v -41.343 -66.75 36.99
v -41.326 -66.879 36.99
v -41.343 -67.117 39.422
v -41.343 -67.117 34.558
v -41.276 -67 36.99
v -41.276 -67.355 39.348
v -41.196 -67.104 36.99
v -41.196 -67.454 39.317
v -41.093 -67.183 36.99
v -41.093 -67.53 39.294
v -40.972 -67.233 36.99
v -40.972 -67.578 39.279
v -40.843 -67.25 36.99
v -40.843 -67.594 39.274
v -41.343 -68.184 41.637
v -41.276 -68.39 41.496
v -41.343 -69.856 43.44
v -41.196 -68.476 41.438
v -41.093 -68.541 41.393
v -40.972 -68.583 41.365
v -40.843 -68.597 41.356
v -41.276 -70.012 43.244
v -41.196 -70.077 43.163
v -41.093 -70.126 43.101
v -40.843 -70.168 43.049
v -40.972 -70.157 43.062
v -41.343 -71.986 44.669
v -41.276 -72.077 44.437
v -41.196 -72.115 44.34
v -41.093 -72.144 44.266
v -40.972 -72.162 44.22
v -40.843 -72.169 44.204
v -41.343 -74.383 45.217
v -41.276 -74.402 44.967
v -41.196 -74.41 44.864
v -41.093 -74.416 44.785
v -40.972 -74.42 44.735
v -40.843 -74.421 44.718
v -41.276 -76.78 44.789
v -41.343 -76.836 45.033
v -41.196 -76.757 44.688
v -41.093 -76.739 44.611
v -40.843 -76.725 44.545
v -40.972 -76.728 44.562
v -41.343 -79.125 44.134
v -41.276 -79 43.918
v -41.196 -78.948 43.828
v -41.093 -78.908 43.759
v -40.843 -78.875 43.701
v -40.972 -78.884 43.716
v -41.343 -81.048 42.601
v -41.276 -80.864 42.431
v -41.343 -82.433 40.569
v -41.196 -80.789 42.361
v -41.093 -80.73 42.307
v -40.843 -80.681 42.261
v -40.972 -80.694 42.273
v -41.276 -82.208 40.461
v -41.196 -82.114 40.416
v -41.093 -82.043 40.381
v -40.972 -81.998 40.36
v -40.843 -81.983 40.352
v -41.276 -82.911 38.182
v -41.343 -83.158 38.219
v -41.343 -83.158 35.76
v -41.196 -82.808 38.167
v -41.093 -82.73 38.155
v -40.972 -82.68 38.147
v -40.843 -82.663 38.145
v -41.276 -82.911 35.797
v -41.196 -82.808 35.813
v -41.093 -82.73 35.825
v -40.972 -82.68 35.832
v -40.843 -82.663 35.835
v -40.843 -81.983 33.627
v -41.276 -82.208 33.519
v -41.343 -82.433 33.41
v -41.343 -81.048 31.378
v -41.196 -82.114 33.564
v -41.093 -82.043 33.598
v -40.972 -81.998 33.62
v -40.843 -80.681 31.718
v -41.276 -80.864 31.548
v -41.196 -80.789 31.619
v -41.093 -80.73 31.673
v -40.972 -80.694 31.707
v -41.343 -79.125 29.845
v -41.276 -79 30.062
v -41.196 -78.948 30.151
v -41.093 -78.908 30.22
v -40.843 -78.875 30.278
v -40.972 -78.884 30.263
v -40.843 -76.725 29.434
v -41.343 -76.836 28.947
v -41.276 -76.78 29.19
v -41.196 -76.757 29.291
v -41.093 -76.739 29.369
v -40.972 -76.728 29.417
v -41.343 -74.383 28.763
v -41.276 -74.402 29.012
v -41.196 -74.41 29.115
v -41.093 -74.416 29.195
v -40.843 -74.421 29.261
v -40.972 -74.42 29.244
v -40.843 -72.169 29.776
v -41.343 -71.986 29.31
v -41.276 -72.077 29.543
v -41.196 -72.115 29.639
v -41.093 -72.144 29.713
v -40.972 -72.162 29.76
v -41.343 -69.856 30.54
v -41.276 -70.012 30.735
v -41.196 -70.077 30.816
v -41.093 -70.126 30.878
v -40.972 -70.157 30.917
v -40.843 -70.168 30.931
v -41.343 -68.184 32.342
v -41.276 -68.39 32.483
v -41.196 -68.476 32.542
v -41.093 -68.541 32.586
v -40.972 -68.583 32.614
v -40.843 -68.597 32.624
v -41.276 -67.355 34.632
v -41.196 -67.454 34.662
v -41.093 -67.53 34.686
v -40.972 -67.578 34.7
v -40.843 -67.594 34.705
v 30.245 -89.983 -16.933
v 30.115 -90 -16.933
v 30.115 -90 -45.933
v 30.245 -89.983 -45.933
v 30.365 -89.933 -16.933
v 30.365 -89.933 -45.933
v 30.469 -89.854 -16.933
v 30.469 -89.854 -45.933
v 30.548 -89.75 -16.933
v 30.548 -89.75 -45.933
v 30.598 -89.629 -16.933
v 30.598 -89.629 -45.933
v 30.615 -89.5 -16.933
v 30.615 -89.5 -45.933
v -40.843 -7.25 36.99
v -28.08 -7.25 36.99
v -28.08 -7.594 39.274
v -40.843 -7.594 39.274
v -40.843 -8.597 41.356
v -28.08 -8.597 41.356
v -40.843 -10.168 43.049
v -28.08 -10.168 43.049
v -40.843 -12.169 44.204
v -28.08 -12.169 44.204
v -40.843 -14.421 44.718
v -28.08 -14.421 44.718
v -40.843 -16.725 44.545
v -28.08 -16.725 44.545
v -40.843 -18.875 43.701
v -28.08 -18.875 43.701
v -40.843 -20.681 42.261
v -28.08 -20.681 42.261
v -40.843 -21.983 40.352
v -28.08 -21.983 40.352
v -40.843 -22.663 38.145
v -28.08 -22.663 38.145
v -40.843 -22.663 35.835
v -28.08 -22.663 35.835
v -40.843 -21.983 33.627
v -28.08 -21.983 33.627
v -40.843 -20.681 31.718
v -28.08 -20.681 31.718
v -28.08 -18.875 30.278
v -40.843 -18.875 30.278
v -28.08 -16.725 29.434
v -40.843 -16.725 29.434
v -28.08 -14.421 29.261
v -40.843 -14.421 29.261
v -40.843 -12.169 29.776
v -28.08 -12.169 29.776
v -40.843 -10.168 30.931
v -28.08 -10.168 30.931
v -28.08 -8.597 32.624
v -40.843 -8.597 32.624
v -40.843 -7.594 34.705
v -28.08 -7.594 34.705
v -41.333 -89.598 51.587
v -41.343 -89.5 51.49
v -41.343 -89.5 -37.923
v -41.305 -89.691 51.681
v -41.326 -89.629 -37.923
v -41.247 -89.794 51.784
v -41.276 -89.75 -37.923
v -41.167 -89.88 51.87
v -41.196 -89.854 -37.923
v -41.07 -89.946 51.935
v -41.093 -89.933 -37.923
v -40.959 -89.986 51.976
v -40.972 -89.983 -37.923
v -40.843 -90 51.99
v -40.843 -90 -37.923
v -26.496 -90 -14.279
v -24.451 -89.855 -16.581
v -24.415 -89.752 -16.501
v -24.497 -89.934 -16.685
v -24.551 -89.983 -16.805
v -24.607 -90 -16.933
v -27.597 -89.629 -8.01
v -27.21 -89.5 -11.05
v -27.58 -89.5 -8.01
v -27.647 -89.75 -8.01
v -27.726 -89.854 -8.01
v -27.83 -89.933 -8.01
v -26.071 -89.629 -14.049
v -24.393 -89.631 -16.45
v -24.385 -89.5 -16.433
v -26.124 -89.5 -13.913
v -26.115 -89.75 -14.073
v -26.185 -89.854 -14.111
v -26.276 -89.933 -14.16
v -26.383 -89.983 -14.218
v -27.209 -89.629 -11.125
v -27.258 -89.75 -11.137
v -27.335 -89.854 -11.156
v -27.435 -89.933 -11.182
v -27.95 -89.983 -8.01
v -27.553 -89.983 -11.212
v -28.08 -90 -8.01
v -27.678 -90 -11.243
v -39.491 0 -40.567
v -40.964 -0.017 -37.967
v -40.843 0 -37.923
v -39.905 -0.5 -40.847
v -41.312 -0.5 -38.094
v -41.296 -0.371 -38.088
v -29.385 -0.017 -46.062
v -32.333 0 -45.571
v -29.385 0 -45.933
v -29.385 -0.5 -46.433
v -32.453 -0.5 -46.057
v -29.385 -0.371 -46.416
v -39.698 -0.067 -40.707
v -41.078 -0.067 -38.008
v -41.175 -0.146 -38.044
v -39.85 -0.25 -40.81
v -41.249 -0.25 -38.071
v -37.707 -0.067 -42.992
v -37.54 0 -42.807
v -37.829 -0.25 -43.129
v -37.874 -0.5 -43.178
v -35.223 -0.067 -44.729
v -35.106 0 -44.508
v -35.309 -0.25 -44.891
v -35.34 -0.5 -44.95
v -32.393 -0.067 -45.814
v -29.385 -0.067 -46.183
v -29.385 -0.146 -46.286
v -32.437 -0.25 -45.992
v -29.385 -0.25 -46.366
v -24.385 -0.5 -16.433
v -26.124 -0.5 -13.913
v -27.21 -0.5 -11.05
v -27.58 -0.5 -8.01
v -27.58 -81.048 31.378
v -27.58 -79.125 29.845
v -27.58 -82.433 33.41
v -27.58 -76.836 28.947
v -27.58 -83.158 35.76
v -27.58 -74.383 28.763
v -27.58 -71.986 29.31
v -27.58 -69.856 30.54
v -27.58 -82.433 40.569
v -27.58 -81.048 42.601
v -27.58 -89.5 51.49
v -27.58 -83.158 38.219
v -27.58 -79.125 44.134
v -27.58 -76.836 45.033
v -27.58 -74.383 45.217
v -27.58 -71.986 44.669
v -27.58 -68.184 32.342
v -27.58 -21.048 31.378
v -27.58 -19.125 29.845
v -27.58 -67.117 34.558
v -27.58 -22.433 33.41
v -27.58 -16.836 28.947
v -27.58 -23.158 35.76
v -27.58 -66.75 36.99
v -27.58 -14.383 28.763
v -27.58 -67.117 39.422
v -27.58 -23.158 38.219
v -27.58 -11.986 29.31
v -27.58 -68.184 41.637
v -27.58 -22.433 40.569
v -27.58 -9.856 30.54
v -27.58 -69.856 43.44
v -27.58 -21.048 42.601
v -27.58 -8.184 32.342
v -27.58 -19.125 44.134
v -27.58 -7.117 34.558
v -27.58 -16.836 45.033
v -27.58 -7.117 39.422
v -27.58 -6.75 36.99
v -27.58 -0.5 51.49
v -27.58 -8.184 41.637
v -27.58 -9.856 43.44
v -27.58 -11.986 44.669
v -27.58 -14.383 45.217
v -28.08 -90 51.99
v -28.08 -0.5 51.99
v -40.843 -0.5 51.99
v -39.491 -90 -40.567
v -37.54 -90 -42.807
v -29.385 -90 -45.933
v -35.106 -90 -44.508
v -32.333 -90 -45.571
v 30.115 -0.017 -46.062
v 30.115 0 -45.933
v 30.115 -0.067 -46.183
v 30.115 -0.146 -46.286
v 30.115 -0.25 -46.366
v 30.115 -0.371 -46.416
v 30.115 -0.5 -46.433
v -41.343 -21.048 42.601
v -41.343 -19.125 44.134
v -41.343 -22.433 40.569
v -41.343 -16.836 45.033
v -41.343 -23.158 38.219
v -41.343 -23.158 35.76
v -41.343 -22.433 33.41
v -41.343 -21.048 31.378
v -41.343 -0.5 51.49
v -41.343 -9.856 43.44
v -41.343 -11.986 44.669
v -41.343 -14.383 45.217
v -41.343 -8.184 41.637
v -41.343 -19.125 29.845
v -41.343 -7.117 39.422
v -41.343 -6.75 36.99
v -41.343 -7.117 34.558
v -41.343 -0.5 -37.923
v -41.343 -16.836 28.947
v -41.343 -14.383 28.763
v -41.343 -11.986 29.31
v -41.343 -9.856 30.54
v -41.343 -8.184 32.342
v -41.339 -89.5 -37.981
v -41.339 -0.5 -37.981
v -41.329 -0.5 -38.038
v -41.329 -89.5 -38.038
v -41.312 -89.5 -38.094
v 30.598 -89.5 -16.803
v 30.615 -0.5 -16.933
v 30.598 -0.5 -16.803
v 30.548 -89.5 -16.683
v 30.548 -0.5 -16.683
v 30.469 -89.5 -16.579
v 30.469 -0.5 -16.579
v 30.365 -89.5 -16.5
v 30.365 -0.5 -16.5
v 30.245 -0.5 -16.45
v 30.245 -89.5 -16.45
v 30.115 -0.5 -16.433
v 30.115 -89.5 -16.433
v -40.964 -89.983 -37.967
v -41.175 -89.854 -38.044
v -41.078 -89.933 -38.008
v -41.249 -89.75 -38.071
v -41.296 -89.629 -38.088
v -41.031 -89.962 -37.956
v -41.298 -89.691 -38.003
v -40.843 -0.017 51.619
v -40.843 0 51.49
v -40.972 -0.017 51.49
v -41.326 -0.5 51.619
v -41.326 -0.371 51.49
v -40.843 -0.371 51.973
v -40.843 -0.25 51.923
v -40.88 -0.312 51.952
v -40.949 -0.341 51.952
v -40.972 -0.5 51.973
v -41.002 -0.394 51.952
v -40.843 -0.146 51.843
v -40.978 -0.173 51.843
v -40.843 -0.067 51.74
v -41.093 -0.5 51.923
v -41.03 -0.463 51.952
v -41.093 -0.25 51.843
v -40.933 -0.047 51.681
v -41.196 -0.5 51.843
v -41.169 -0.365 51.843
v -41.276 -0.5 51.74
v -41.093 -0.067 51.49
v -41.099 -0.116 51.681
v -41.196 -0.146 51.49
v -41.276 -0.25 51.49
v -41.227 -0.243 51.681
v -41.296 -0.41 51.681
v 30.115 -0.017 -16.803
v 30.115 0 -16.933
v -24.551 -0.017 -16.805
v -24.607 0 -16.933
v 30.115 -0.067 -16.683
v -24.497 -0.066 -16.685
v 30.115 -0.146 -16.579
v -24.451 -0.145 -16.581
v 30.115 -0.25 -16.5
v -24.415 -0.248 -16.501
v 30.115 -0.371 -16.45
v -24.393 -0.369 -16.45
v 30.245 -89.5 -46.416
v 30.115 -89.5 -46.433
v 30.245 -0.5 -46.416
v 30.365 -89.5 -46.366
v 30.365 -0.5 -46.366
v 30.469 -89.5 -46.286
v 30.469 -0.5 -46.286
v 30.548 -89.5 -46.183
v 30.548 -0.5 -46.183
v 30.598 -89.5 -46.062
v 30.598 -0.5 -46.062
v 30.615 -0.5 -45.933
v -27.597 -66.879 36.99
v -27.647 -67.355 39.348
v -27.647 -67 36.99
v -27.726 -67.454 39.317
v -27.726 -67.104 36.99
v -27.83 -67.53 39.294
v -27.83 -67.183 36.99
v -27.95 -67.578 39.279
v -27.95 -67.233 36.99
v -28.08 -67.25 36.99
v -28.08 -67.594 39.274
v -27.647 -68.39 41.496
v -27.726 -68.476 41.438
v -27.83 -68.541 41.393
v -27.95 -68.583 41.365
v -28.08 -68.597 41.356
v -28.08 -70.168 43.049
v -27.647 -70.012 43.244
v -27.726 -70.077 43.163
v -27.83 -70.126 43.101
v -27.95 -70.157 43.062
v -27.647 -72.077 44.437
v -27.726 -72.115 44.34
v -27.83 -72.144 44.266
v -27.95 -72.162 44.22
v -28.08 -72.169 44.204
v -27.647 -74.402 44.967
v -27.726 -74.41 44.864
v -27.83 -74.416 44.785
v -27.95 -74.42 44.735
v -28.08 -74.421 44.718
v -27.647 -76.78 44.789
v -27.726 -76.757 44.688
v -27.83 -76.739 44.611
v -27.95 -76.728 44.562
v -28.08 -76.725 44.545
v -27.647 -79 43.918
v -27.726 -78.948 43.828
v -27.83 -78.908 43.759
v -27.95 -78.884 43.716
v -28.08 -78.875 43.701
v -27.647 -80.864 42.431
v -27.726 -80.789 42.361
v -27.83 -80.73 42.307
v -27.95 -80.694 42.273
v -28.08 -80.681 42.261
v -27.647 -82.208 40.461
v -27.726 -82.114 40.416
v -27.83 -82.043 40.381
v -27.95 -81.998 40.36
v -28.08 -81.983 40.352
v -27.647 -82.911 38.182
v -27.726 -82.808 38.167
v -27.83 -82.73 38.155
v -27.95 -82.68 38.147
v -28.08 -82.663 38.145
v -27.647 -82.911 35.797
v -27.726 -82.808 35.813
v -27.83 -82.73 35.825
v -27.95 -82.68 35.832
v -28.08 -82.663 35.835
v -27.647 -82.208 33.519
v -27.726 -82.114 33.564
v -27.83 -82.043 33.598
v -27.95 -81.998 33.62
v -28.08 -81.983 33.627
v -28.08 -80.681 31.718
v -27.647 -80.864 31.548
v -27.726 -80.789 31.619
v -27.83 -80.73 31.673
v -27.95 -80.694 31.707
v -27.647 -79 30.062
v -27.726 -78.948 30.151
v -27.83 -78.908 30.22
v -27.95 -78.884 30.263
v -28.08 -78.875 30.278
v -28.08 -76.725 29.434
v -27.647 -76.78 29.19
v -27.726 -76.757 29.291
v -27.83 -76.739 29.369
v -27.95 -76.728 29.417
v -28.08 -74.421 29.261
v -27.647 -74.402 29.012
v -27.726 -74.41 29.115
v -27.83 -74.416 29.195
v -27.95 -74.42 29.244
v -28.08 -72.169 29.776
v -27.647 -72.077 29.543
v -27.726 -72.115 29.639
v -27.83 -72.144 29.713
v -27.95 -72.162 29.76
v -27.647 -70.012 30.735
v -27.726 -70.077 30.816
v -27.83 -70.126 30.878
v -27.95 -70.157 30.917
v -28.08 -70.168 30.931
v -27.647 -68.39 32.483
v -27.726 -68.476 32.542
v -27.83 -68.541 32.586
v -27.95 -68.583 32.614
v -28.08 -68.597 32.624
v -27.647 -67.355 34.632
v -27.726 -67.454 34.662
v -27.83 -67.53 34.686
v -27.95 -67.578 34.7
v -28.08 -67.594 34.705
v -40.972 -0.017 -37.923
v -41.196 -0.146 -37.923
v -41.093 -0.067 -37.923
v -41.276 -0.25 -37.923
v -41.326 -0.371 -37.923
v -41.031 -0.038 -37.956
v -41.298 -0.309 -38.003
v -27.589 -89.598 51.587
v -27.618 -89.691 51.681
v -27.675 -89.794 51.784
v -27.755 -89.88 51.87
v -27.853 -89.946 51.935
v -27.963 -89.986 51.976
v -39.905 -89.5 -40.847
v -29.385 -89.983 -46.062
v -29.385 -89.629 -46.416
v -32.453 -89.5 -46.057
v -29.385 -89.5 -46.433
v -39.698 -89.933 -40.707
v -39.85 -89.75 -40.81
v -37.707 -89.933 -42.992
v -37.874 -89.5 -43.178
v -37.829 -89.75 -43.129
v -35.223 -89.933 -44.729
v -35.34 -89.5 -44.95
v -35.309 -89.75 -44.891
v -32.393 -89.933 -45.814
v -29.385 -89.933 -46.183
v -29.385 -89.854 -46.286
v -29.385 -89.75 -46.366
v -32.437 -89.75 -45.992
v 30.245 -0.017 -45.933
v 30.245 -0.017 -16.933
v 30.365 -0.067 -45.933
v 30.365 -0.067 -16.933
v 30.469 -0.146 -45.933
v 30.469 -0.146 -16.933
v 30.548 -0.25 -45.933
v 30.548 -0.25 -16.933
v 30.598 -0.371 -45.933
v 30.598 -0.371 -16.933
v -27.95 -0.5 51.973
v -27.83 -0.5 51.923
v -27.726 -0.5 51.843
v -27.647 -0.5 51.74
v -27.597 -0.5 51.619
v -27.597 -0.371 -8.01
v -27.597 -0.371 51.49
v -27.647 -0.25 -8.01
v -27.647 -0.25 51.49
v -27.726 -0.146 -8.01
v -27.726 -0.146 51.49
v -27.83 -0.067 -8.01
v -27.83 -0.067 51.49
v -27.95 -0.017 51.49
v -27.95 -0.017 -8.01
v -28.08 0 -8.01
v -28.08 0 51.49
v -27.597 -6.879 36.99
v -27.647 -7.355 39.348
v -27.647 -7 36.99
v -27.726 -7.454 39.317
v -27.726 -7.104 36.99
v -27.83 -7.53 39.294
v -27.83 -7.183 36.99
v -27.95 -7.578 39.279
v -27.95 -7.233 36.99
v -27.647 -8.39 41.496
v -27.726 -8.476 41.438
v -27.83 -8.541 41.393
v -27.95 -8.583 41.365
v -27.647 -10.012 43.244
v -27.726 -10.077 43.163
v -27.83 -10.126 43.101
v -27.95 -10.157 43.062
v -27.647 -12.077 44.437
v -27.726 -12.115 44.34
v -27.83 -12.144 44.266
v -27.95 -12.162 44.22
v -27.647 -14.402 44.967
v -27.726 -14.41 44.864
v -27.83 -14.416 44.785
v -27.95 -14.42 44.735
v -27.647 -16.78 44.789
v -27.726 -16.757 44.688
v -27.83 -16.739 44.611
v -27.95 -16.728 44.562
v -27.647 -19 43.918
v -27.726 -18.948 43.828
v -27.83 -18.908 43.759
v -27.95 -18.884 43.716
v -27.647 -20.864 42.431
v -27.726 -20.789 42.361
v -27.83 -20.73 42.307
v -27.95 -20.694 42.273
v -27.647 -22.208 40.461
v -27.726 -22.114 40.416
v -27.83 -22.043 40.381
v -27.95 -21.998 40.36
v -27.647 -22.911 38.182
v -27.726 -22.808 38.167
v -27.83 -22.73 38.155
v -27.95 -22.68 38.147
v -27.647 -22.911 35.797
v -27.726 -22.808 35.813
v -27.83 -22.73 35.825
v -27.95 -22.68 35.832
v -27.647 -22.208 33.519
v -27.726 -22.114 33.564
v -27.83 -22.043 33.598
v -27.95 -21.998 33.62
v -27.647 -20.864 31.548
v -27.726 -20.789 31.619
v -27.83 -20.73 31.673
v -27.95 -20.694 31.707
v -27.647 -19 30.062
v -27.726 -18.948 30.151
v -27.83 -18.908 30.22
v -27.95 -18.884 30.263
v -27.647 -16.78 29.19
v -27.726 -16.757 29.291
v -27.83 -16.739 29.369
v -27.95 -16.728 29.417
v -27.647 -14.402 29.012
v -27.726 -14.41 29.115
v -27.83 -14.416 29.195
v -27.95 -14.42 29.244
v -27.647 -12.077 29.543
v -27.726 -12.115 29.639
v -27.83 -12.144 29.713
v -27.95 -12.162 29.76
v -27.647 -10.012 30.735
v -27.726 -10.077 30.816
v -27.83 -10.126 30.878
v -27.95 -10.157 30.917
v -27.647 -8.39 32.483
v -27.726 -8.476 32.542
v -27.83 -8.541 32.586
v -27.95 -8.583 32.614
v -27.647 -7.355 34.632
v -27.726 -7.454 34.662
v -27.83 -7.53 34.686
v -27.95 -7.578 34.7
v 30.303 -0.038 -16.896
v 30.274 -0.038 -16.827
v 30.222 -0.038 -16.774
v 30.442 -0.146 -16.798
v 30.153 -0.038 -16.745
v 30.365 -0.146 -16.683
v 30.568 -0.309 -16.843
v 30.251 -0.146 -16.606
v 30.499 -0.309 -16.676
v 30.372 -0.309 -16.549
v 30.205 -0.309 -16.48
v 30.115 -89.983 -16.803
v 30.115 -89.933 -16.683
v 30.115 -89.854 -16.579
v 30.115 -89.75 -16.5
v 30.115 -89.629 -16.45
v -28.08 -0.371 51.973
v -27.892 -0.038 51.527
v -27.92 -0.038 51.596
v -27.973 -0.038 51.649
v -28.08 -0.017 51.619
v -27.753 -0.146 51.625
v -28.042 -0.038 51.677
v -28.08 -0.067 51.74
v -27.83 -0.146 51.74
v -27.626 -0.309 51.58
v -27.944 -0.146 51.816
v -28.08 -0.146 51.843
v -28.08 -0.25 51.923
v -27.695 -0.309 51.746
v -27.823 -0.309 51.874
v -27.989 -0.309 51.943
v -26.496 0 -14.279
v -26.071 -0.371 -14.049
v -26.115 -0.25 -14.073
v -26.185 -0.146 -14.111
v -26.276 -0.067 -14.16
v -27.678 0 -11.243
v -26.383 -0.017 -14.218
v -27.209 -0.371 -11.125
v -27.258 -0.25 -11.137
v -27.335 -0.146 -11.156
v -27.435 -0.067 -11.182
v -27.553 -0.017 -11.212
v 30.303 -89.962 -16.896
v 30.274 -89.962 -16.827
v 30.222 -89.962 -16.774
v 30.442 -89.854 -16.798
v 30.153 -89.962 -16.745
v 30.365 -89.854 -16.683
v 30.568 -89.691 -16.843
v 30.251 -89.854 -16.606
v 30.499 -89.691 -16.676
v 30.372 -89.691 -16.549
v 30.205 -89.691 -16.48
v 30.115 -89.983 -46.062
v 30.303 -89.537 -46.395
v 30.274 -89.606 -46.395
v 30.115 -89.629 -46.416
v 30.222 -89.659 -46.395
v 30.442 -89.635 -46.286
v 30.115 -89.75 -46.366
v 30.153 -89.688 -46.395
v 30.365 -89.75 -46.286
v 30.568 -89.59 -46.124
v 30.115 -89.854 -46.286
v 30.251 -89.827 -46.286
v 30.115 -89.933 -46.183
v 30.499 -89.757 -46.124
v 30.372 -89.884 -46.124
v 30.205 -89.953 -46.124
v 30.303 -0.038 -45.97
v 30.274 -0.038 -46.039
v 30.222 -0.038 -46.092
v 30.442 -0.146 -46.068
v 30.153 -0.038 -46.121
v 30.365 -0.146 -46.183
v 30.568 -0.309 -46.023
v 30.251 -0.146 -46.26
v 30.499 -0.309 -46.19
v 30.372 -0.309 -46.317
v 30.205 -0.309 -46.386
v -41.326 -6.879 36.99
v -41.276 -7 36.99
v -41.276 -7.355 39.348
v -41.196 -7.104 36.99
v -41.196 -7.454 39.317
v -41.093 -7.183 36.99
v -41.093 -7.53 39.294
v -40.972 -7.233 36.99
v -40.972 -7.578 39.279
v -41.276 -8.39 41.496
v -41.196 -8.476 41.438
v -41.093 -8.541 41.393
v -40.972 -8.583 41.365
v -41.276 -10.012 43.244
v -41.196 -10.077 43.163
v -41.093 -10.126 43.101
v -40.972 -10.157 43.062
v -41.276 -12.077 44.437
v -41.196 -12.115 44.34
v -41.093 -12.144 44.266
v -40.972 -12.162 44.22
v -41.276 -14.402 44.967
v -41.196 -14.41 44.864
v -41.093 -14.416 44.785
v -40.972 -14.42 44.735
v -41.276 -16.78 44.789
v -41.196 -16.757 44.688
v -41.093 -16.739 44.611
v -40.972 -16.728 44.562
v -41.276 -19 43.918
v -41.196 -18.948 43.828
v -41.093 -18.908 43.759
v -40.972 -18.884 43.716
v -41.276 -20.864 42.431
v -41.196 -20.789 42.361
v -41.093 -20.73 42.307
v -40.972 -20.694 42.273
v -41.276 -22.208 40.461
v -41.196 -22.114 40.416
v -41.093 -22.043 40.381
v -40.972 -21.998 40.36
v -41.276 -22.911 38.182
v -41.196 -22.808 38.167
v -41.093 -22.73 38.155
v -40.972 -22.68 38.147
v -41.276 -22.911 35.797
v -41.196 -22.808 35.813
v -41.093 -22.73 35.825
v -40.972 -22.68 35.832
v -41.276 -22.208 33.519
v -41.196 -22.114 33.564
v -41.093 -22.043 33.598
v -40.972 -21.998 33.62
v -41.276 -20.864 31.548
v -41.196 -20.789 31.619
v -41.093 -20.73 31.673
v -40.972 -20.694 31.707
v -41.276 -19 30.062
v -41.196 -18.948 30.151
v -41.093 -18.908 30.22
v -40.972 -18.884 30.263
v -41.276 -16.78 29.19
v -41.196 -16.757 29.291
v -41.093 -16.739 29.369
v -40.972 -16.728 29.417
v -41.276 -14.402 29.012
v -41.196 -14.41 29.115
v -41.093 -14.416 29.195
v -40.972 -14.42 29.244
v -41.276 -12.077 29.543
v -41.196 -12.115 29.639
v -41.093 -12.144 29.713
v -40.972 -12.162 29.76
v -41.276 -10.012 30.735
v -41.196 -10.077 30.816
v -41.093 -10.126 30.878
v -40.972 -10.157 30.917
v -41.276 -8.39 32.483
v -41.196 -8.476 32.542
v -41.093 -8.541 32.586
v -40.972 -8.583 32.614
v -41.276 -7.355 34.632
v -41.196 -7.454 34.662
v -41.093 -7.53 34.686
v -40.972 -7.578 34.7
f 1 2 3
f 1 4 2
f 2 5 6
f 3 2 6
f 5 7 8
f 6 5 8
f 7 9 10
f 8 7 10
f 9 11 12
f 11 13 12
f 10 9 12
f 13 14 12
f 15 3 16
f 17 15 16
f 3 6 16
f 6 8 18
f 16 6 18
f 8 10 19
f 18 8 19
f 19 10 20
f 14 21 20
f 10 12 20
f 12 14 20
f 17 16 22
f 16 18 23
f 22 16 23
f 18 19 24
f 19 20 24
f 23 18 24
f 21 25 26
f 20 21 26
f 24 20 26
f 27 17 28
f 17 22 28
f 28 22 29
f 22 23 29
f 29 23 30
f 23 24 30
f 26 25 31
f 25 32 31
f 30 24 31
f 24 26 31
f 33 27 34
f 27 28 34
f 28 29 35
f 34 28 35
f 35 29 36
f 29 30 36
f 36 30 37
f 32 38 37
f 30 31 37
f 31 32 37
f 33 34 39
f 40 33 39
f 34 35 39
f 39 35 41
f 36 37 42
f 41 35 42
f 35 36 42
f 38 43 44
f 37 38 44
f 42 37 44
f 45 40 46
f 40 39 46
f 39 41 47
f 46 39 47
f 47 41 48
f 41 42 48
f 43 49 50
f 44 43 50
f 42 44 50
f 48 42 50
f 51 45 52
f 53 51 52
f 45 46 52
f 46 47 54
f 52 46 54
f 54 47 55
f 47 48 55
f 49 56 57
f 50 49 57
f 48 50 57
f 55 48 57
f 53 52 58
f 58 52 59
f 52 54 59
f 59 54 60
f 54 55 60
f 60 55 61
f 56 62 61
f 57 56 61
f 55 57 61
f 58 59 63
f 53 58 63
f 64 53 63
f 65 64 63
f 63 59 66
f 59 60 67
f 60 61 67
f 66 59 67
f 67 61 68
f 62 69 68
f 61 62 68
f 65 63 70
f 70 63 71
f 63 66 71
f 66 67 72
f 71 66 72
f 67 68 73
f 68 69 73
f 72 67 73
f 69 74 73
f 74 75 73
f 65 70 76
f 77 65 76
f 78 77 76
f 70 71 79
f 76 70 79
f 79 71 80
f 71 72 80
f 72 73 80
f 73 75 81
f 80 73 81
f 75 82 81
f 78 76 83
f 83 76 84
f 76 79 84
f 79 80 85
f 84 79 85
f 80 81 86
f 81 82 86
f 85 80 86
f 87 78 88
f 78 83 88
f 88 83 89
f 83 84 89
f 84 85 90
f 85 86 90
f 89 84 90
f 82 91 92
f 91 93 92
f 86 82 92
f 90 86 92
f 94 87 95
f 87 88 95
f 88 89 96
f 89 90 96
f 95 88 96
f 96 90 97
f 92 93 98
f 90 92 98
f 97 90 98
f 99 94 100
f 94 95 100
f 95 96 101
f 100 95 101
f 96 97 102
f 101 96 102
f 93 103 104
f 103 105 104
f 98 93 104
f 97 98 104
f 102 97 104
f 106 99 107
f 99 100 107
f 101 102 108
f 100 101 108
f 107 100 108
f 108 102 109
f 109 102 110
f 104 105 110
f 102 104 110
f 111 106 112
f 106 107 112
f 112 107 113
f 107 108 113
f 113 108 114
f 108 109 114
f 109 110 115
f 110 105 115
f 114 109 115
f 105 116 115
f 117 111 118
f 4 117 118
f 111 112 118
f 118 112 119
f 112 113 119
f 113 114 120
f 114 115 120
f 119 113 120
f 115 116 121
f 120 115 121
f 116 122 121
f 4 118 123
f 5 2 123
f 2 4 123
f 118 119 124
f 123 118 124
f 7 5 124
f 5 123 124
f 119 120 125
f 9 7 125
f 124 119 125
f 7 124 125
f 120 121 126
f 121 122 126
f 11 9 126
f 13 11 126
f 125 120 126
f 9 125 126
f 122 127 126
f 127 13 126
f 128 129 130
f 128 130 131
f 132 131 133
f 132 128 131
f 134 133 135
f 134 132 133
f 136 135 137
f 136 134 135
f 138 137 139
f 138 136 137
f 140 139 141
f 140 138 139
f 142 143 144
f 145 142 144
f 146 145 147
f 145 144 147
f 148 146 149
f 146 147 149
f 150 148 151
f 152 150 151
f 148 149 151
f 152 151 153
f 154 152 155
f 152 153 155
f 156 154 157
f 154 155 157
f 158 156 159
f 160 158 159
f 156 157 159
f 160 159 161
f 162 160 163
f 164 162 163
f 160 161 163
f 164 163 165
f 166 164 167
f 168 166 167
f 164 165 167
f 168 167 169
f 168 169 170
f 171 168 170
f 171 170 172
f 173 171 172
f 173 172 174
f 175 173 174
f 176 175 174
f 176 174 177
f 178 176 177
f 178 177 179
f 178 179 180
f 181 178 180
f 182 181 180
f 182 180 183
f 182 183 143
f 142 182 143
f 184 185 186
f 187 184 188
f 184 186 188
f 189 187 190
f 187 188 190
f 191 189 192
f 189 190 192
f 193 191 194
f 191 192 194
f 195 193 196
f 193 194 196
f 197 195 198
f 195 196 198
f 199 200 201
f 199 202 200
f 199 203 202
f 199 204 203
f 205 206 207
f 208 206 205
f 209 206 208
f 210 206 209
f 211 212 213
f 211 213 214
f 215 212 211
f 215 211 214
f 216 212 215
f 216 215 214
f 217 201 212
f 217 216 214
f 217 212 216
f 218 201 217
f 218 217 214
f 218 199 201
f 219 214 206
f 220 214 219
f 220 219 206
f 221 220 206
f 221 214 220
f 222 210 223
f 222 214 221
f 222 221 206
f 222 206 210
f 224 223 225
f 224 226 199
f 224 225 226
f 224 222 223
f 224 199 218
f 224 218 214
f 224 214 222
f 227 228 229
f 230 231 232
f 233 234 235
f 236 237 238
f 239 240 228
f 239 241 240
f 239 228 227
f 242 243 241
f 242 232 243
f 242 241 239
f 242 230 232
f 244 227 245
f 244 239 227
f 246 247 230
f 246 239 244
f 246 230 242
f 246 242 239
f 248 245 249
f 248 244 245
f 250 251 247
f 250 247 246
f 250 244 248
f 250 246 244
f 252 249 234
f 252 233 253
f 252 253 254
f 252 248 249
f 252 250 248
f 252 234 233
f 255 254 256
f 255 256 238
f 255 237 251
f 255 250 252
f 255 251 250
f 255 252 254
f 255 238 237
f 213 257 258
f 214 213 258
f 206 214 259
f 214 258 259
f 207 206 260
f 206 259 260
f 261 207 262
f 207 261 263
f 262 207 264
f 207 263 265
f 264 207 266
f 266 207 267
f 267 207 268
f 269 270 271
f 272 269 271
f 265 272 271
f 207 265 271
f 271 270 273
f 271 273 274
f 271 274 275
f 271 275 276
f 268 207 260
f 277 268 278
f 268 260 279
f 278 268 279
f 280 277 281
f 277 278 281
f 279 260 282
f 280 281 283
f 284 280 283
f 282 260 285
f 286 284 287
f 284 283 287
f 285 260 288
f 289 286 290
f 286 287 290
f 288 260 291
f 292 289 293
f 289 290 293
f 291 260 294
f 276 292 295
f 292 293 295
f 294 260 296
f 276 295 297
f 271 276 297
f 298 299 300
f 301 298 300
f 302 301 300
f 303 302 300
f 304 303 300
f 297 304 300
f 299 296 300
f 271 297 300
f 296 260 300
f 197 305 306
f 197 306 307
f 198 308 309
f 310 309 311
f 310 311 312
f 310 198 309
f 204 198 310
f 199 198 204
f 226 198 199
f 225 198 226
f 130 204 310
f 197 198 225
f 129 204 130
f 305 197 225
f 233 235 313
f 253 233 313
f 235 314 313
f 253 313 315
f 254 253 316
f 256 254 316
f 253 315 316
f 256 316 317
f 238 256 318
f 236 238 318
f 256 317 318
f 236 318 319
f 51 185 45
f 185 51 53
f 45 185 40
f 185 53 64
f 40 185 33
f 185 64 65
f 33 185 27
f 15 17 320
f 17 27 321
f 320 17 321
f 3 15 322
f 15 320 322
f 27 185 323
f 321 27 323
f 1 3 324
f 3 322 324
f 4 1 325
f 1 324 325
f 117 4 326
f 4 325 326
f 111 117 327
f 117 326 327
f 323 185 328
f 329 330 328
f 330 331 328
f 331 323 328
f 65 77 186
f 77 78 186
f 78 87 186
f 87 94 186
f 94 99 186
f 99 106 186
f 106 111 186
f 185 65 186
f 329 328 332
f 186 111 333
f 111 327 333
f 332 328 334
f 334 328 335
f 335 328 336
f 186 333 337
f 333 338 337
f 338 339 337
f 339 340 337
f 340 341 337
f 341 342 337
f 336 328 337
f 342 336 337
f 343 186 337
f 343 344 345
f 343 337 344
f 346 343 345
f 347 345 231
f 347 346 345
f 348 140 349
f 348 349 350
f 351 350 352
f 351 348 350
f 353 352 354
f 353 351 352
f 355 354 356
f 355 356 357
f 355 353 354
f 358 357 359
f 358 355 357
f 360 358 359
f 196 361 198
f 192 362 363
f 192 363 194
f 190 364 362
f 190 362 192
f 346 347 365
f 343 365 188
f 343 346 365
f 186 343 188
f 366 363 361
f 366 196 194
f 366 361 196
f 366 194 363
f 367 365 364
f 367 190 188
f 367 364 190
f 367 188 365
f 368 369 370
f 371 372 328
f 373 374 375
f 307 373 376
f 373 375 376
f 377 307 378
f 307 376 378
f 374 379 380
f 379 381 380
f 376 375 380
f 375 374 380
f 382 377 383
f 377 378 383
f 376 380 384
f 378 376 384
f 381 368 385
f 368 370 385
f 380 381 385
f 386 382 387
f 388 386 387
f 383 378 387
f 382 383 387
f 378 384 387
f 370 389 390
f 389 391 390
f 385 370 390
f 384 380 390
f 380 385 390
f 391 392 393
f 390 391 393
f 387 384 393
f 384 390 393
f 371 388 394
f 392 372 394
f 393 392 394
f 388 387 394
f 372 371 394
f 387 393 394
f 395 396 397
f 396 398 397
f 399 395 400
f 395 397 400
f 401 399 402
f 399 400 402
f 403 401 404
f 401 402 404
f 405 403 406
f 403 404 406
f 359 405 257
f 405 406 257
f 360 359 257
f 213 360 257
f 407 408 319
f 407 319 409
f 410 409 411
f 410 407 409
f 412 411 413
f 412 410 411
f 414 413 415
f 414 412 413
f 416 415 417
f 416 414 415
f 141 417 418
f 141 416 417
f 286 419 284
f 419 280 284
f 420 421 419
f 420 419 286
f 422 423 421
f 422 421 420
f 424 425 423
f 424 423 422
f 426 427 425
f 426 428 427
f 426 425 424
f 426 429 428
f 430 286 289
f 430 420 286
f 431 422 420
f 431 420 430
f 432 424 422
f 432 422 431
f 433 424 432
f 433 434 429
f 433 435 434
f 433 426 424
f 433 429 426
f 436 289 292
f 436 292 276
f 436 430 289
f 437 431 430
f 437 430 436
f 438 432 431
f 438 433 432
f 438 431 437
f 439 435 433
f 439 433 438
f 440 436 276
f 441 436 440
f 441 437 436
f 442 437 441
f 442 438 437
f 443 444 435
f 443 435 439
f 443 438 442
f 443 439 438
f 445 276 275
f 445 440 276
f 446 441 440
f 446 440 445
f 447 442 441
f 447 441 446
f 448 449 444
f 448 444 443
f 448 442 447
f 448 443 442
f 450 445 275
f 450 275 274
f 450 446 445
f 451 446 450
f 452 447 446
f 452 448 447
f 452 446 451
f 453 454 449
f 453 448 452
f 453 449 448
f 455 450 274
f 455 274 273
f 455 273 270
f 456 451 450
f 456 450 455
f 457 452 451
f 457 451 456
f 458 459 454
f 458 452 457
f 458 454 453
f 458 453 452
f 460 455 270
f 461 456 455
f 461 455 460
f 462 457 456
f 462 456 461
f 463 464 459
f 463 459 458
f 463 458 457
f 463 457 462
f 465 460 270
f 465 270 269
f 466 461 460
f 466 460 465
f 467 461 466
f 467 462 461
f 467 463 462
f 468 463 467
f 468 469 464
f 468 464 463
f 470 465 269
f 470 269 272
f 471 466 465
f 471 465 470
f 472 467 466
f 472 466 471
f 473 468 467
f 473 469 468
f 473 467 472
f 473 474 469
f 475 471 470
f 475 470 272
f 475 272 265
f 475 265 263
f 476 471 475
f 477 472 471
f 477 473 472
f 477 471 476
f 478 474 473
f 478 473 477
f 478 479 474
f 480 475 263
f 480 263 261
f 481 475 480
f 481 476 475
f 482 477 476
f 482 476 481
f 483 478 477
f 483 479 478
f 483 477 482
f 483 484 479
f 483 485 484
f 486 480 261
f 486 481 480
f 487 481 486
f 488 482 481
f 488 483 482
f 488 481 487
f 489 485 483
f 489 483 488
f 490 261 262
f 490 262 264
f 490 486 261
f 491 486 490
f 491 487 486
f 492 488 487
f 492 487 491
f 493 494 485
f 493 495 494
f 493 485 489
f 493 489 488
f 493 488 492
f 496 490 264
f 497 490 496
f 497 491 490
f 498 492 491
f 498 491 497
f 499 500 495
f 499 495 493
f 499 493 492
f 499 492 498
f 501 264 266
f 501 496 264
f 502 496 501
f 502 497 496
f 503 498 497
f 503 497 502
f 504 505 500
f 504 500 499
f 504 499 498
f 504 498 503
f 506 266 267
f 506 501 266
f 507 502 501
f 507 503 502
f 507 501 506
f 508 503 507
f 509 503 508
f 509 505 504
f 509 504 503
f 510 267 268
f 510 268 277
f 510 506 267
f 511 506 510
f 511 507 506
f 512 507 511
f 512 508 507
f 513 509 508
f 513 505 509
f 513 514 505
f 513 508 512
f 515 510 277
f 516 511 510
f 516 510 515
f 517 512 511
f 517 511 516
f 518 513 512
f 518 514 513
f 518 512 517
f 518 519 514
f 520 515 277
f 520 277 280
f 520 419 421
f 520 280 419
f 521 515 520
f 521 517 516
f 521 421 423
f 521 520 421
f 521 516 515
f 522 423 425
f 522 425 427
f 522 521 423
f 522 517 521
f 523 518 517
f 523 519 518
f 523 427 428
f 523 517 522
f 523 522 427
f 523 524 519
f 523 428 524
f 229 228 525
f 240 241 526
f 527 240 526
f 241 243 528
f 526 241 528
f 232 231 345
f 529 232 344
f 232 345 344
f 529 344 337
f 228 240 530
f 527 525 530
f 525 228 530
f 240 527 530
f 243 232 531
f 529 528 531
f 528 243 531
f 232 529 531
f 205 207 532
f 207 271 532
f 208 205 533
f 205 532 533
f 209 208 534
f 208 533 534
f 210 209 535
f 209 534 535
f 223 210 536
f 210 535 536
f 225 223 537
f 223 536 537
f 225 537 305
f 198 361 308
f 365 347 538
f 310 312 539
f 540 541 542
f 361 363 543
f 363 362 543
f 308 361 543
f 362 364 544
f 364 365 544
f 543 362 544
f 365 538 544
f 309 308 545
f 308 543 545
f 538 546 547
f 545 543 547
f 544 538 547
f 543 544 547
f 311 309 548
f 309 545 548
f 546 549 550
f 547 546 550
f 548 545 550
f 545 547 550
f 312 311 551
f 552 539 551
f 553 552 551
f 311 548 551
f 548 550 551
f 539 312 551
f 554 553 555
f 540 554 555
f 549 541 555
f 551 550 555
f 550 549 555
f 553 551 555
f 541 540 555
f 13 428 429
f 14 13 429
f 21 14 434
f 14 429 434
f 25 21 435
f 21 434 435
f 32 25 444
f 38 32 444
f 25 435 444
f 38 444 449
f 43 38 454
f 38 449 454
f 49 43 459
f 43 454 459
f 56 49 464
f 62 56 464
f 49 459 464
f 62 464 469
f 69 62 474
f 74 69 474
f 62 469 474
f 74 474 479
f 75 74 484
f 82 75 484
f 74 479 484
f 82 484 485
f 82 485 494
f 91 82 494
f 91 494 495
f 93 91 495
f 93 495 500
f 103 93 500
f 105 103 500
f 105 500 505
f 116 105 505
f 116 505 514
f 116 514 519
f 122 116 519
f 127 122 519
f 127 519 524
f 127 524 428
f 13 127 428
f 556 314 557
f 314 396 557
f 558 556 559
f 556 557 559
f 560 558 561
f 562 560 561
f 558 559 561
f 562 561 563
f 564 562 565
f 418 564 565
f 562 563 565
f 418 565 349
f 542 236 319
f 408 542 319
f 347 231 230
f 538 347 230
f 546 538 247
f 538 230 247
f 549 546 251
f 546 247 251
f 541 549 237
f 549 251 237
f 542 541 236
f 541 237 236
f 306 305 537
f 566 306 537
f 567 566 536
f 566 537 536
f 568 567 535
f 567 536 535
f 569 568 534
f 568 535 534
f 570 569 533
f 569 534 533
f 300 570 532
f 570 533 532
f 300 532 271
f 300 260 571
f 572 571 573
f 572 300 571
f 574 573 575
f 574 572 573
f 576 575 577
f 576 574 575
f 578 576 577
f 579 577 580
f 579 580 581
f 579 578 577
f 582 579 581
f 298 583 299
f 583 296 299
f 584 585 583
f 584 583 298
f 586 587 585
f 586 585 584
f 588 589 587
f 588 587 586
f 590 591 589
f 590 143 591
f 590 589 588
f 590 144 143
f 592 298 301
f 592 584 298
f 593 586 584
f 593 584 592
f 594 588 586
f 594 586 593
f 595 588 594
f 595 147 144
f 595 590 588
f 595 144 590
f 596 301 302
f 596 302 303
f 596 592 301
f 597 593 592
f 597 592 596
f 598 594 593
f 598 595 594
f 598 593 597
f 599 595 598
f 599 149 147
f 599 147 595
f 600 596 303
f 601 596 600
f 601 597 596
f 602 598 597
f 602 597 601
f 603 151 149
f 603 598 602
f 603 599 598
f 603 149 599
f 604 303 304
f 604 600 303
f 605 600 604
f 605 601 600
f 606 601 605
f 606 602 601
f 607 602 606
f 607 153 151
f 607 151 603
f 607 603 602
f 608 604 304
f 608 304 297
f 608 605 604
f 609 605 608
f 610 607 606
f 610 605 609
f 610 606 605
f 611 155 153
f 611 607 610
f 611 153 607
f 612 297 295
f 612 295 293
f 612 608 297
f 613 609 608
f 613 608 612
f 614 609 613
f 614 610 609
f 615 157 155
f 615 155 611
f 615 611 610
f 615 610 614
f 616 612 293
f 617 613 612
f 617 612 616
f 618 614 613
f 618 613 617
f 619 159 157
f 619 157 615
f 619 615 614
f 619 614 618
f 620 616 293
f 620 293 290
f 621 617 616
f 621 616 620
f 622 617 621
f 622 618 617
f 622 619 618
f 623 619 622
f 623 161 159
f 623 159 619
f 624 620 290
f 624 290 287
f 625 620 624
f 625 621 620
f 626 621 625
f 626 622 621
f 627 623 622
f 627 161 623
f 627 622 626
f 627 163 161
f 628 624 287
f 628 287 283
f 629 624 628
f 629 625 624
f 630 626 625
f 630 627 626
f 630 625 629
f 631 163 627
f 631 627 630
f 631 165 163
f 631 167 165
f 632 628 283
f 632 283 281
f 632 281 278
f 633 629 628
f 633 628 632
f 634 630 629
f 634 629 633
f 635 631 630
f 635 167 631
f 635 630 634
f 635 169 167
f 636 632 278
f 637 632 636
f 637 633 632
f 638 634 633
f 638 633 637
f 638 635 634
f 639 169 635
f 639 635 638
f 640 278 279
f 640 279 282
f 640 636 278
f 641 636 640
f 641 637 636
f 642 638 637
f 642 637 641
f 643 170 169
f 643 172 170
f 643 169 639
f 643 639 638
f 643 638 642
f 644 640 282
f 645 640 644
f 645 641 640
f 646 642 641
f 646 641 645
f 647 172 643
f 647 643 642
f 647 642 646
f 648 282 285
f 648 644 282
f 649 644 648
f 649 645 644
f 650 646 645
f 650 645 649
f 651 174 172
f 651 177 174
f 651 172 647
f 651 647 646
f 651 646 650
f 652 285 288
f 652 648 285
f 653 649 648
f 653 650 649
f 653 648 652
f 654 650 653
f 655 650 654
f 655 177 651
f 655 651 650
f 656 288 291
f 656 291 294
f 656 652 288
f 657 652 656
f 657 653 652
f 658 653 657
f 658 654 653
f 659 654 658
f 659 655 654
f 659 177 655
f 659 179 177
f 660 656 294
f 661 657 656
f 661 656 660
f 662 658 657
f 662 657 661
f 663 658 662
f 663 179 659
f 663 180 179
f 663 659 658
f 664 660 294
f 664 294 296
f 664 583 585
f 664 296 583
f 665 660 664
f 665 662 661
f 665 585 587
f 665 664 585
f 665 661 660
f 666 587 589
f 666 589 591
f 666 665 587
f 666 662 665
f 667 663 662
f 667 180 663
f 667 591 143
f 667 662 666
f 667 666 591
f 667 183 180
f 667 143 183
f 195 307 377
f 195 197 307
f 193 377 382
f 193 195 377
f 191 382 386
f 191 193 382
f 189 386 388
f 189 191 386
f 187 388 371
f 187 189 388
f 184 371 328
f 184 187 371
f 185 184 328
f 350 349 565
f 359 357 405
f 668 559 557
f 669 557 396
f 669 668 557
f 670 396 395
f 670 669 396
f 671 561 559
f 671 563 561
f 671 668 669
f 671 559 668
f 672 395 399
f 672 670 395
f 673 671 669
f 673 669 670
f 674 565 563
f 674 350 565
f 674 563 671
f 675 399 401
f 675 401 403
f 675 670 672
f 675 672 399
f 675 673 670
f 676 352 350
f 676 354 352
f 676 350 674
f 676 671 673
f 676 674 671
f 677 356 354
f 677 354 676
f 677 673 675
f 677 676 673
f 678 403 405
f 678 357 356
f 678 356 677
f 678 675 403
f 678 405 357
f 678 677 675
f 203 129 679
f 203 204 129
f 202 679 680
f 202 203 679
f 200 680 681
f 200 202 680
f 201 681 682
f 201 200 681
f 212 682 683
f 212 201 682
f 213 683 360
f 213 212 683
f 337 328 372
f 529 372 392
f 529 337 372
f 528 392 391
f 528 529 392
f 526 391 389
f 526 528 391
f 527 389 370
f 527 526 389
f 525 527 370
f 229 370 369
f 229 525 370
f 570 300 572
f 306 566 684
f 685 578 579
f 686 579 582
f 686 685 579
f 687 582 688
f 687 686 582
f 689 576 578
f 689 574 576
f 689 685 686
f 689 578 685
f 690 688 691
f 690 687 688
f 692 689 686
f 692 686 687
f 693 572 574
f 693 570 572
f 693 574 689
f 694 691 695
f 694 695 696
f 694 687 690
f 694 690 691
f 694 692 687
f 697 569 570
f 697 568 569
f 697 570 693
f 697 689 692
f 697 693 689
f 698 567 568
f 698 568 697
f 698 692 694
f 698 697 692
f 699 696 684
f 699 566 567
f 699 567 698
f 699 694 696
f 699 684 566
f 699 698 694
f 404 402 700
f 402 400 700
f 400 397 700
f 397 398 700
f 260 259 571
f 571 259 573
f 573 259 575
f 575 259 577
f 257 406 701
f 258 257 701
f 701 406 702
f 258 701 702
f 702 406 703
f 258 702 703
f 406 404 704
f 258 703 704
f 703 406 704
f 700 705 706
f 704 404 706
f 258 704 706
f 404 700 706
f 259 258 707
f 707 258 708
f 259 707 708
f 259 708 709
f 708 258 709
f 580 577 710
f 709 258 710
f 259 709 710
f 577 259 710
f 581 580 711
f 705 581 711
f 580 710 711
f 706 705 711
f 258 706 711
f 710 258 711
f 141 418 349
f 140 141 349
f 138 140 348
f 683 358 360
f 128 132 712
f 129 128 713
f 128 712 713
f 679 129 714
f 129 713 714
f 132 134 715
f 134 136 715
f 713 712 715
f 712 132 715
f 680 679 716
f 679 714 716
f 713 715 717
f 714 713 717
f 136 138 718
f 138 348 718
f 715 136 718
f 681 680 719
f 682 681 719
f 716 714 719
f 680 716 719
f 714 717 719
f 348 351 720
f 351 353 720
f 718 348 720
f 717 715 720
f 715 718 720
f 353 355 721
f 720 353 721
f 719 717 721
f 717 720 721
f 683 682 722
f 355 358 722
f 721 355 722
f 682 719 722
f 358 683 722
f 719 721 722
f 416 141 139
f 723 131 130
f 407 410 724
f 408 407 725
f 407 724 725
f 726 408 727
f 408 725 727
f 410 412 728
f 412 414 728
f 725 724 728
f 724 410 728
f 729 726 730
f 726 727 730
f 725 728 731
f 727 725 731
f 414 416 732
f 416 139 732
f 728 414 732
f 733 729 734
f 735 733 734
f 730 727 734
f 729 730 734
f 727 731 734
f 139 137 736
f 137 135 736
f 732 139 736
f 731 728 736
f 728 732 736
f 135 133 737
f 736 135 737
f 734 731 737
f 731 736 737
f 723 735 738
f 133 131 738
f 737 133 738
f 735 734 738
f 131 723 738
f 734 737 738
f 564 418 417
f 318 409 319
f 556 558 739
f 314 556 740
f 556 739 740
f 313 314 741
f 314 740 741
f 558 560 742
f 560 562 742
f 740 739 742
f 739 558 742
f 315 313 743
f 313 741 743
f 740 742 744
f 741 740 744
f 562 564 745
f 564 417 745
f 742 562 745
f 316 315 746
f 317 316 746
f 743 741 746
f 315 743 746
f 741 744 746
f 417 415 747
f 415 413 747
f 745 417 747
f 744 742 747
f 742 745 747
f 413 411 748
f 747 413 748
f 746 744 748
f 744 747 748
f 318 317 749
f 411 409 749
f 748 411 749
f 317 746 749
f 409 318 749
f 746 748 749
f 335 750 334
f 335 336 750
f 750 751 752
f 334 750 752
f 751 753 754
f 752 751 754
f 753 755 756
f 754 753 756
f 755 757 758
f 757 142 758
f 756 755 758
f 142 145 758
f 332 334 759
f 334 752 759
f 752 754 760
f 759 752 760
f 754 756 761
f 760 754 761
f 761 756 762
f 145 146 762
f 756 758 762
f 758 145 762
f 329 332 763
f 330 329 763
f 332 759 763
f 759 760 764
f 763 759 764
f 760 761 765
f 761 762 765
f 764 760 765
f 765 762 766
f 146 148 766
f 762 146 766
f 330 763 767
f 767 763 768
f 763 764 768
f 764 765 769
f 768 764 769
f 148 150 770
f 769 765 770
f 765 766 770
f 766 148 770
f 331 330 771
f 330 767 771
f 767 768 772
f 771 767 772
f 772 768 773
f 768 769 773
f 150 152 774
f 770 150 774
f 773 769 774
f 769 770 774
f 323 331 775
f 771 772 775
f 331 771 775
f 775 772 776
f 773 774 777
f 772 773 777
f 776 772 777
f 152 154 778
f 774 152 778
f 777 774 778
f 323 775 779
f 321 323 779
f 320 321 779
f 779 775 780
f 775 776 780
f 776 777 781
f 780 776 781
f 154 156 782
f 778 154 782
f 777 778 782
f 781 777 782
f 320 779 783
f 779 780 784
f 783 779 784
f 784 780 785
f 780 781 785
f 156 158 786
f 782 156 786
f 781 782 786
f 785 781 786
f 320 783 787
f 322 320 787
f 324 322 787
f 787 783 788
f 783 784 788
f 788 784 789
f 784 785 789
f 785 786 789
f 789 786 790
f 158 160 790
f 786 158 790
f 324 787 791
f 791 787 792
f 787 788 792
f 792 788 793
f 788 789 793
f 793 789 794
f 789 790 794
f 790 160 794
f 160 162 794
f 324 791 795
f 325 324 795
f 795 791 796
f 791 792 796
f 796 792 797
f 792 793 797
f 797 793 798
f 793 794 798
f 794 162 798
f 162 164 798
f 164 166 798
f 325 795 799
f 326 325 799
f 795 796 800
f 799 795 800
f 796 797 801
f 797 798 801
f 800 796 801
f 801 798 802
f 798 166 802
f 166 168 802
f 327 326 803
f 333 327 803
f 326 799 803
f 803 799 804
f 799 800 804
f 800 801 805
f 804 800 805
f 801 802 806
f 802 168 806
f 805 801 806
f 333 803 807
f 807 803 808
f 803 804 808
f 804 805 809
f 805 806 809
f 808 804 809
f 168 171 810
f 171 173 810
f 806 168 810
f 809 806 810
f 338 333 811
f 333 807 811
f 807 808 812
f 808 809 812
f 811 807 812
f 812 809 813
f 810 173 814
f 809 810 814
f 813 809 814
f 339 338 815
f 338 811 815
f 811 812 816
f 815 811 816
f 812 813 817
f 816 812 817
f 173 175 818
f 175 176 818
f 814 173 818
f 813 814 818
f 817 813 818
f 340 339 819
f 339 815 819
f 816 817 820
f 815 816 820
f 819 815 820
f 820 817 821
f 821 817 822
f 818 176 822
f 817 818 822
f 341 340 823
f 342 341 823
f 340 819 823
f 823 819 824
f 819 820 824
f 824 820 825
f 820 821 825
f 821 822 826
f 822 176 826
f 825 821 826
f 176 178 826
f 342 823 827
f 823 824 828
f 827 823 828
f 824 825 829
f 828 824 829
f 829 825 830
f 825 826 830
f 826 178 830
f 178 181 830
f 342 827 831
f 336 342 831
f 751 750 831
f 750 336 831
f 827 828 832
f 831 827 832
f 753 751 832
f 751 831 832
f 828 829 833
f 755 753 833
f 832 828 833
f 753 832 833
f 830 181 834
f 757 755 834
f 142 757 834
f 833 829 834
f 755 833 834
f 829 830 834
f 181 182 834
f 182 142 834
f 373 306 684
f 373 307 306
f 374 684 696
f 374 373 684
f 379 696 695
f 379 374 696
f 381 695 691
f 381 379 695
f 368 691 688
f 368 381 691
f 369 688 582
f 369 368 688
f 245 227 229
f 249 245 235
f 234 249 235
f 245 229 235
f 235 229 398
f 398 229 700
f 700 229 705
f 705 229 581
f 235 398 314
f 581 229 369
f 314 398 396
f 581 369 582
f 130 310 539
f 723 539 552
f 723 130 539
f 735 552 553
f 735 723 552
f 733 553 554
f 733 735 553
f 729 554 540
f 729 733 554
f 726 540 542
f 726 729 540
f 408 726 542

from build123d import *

# Parameters (mm, degrees)
F1_DEPTH = 90
F2_R     = 7.75
F3_DEPTH = 25
F4_R     = 0.5
F5_R     = 0.5


with BuildPart() as f1:
    # F0 (on Front) → F1 (new body)
    with BuildSketch(Plane.XZ):
        with BuildLine():
            Line((-27.57953, 51.989783), (-41.342754, 51.989783))
            Line((-41.342754, 51.989783), (-41.342754, -21.076756))
            Line((-41.342754, -21.076756), (-41.342754, -38.010217))
            ThreePointArc((-41.342754, -38.010217), (-36.697997, -44.115849), (-29.384729, -46.432877))
            Line((-29.384729, -46.432877), (30.615271, -46.432877))
            Line((30.615271, -46.432877), (30.615271, -16.432877))
            Line((30.615271, -16.432877), (-24.384729, -16.432877))
            ThreePointArc((-24.384729, -16.432877), (-26.753999, -12.514325), (-27.57953, -8.010217))
            Line((-27.57953, -8.010217), (-27.57953, 51.989783))
        make_face()
    extrude(amount=F1_DEPTH)

    # F2 (on face) → F3 (cut)
    with BuildSketch(Plane.YZ.offset(-27.57953)):
        with Locations((-75, 36.989783)):
            Circle(F2_R)
        with Locations((-15, 36.989783)):
            Circle(F2_R)
    extrude(amount=-F3_DEPTH, mode=Mode.SUBTRACT)

    # F4
    f4_edges = [f1.edges().sort_by_distance(p)[0] for p in [
        (-27.57953, -45, 51.989783),
        (-27.57953, 0, 21.989783),
        (-27.57953, -90, 21.989783),
        (30.615271, -45, -16.432877),
        (30.615271, -90, -31.432877),
        (30.615271, -45, -46.432877),
        (30.615271, 0, -31.432877),
        (3.115271, 0, -16.432877),
        (0.615271, 0, -46.432877),
        (-41.342754, 0, 6.989783),
        (-34.461142, 0, 51.989783),
        (-41.342754, -45, 51.989783),
        (-41.342754, -90, 6.989783),
        (-41.342754, -45, -38.010217),
        (0.615271, -90, -46.432877),
        (3.115271, -90, -16.432877),
    ]]
    fillet(f4_edges, radius=F4_R)

    # F5
    f5_edges = [f1.edges().sort_by_distance(p)[0] for p in [
        (-27.57953, -22.75, 36.989783),
        (-27.57953, -82.75, 36.989783),
        (-41.342754, -82.75, 36.989783),
        (-41.342754, -22.75, 36.989783),
    ]]
    fillet(f5_edges, radius=F5_R)


solid = f1.part
